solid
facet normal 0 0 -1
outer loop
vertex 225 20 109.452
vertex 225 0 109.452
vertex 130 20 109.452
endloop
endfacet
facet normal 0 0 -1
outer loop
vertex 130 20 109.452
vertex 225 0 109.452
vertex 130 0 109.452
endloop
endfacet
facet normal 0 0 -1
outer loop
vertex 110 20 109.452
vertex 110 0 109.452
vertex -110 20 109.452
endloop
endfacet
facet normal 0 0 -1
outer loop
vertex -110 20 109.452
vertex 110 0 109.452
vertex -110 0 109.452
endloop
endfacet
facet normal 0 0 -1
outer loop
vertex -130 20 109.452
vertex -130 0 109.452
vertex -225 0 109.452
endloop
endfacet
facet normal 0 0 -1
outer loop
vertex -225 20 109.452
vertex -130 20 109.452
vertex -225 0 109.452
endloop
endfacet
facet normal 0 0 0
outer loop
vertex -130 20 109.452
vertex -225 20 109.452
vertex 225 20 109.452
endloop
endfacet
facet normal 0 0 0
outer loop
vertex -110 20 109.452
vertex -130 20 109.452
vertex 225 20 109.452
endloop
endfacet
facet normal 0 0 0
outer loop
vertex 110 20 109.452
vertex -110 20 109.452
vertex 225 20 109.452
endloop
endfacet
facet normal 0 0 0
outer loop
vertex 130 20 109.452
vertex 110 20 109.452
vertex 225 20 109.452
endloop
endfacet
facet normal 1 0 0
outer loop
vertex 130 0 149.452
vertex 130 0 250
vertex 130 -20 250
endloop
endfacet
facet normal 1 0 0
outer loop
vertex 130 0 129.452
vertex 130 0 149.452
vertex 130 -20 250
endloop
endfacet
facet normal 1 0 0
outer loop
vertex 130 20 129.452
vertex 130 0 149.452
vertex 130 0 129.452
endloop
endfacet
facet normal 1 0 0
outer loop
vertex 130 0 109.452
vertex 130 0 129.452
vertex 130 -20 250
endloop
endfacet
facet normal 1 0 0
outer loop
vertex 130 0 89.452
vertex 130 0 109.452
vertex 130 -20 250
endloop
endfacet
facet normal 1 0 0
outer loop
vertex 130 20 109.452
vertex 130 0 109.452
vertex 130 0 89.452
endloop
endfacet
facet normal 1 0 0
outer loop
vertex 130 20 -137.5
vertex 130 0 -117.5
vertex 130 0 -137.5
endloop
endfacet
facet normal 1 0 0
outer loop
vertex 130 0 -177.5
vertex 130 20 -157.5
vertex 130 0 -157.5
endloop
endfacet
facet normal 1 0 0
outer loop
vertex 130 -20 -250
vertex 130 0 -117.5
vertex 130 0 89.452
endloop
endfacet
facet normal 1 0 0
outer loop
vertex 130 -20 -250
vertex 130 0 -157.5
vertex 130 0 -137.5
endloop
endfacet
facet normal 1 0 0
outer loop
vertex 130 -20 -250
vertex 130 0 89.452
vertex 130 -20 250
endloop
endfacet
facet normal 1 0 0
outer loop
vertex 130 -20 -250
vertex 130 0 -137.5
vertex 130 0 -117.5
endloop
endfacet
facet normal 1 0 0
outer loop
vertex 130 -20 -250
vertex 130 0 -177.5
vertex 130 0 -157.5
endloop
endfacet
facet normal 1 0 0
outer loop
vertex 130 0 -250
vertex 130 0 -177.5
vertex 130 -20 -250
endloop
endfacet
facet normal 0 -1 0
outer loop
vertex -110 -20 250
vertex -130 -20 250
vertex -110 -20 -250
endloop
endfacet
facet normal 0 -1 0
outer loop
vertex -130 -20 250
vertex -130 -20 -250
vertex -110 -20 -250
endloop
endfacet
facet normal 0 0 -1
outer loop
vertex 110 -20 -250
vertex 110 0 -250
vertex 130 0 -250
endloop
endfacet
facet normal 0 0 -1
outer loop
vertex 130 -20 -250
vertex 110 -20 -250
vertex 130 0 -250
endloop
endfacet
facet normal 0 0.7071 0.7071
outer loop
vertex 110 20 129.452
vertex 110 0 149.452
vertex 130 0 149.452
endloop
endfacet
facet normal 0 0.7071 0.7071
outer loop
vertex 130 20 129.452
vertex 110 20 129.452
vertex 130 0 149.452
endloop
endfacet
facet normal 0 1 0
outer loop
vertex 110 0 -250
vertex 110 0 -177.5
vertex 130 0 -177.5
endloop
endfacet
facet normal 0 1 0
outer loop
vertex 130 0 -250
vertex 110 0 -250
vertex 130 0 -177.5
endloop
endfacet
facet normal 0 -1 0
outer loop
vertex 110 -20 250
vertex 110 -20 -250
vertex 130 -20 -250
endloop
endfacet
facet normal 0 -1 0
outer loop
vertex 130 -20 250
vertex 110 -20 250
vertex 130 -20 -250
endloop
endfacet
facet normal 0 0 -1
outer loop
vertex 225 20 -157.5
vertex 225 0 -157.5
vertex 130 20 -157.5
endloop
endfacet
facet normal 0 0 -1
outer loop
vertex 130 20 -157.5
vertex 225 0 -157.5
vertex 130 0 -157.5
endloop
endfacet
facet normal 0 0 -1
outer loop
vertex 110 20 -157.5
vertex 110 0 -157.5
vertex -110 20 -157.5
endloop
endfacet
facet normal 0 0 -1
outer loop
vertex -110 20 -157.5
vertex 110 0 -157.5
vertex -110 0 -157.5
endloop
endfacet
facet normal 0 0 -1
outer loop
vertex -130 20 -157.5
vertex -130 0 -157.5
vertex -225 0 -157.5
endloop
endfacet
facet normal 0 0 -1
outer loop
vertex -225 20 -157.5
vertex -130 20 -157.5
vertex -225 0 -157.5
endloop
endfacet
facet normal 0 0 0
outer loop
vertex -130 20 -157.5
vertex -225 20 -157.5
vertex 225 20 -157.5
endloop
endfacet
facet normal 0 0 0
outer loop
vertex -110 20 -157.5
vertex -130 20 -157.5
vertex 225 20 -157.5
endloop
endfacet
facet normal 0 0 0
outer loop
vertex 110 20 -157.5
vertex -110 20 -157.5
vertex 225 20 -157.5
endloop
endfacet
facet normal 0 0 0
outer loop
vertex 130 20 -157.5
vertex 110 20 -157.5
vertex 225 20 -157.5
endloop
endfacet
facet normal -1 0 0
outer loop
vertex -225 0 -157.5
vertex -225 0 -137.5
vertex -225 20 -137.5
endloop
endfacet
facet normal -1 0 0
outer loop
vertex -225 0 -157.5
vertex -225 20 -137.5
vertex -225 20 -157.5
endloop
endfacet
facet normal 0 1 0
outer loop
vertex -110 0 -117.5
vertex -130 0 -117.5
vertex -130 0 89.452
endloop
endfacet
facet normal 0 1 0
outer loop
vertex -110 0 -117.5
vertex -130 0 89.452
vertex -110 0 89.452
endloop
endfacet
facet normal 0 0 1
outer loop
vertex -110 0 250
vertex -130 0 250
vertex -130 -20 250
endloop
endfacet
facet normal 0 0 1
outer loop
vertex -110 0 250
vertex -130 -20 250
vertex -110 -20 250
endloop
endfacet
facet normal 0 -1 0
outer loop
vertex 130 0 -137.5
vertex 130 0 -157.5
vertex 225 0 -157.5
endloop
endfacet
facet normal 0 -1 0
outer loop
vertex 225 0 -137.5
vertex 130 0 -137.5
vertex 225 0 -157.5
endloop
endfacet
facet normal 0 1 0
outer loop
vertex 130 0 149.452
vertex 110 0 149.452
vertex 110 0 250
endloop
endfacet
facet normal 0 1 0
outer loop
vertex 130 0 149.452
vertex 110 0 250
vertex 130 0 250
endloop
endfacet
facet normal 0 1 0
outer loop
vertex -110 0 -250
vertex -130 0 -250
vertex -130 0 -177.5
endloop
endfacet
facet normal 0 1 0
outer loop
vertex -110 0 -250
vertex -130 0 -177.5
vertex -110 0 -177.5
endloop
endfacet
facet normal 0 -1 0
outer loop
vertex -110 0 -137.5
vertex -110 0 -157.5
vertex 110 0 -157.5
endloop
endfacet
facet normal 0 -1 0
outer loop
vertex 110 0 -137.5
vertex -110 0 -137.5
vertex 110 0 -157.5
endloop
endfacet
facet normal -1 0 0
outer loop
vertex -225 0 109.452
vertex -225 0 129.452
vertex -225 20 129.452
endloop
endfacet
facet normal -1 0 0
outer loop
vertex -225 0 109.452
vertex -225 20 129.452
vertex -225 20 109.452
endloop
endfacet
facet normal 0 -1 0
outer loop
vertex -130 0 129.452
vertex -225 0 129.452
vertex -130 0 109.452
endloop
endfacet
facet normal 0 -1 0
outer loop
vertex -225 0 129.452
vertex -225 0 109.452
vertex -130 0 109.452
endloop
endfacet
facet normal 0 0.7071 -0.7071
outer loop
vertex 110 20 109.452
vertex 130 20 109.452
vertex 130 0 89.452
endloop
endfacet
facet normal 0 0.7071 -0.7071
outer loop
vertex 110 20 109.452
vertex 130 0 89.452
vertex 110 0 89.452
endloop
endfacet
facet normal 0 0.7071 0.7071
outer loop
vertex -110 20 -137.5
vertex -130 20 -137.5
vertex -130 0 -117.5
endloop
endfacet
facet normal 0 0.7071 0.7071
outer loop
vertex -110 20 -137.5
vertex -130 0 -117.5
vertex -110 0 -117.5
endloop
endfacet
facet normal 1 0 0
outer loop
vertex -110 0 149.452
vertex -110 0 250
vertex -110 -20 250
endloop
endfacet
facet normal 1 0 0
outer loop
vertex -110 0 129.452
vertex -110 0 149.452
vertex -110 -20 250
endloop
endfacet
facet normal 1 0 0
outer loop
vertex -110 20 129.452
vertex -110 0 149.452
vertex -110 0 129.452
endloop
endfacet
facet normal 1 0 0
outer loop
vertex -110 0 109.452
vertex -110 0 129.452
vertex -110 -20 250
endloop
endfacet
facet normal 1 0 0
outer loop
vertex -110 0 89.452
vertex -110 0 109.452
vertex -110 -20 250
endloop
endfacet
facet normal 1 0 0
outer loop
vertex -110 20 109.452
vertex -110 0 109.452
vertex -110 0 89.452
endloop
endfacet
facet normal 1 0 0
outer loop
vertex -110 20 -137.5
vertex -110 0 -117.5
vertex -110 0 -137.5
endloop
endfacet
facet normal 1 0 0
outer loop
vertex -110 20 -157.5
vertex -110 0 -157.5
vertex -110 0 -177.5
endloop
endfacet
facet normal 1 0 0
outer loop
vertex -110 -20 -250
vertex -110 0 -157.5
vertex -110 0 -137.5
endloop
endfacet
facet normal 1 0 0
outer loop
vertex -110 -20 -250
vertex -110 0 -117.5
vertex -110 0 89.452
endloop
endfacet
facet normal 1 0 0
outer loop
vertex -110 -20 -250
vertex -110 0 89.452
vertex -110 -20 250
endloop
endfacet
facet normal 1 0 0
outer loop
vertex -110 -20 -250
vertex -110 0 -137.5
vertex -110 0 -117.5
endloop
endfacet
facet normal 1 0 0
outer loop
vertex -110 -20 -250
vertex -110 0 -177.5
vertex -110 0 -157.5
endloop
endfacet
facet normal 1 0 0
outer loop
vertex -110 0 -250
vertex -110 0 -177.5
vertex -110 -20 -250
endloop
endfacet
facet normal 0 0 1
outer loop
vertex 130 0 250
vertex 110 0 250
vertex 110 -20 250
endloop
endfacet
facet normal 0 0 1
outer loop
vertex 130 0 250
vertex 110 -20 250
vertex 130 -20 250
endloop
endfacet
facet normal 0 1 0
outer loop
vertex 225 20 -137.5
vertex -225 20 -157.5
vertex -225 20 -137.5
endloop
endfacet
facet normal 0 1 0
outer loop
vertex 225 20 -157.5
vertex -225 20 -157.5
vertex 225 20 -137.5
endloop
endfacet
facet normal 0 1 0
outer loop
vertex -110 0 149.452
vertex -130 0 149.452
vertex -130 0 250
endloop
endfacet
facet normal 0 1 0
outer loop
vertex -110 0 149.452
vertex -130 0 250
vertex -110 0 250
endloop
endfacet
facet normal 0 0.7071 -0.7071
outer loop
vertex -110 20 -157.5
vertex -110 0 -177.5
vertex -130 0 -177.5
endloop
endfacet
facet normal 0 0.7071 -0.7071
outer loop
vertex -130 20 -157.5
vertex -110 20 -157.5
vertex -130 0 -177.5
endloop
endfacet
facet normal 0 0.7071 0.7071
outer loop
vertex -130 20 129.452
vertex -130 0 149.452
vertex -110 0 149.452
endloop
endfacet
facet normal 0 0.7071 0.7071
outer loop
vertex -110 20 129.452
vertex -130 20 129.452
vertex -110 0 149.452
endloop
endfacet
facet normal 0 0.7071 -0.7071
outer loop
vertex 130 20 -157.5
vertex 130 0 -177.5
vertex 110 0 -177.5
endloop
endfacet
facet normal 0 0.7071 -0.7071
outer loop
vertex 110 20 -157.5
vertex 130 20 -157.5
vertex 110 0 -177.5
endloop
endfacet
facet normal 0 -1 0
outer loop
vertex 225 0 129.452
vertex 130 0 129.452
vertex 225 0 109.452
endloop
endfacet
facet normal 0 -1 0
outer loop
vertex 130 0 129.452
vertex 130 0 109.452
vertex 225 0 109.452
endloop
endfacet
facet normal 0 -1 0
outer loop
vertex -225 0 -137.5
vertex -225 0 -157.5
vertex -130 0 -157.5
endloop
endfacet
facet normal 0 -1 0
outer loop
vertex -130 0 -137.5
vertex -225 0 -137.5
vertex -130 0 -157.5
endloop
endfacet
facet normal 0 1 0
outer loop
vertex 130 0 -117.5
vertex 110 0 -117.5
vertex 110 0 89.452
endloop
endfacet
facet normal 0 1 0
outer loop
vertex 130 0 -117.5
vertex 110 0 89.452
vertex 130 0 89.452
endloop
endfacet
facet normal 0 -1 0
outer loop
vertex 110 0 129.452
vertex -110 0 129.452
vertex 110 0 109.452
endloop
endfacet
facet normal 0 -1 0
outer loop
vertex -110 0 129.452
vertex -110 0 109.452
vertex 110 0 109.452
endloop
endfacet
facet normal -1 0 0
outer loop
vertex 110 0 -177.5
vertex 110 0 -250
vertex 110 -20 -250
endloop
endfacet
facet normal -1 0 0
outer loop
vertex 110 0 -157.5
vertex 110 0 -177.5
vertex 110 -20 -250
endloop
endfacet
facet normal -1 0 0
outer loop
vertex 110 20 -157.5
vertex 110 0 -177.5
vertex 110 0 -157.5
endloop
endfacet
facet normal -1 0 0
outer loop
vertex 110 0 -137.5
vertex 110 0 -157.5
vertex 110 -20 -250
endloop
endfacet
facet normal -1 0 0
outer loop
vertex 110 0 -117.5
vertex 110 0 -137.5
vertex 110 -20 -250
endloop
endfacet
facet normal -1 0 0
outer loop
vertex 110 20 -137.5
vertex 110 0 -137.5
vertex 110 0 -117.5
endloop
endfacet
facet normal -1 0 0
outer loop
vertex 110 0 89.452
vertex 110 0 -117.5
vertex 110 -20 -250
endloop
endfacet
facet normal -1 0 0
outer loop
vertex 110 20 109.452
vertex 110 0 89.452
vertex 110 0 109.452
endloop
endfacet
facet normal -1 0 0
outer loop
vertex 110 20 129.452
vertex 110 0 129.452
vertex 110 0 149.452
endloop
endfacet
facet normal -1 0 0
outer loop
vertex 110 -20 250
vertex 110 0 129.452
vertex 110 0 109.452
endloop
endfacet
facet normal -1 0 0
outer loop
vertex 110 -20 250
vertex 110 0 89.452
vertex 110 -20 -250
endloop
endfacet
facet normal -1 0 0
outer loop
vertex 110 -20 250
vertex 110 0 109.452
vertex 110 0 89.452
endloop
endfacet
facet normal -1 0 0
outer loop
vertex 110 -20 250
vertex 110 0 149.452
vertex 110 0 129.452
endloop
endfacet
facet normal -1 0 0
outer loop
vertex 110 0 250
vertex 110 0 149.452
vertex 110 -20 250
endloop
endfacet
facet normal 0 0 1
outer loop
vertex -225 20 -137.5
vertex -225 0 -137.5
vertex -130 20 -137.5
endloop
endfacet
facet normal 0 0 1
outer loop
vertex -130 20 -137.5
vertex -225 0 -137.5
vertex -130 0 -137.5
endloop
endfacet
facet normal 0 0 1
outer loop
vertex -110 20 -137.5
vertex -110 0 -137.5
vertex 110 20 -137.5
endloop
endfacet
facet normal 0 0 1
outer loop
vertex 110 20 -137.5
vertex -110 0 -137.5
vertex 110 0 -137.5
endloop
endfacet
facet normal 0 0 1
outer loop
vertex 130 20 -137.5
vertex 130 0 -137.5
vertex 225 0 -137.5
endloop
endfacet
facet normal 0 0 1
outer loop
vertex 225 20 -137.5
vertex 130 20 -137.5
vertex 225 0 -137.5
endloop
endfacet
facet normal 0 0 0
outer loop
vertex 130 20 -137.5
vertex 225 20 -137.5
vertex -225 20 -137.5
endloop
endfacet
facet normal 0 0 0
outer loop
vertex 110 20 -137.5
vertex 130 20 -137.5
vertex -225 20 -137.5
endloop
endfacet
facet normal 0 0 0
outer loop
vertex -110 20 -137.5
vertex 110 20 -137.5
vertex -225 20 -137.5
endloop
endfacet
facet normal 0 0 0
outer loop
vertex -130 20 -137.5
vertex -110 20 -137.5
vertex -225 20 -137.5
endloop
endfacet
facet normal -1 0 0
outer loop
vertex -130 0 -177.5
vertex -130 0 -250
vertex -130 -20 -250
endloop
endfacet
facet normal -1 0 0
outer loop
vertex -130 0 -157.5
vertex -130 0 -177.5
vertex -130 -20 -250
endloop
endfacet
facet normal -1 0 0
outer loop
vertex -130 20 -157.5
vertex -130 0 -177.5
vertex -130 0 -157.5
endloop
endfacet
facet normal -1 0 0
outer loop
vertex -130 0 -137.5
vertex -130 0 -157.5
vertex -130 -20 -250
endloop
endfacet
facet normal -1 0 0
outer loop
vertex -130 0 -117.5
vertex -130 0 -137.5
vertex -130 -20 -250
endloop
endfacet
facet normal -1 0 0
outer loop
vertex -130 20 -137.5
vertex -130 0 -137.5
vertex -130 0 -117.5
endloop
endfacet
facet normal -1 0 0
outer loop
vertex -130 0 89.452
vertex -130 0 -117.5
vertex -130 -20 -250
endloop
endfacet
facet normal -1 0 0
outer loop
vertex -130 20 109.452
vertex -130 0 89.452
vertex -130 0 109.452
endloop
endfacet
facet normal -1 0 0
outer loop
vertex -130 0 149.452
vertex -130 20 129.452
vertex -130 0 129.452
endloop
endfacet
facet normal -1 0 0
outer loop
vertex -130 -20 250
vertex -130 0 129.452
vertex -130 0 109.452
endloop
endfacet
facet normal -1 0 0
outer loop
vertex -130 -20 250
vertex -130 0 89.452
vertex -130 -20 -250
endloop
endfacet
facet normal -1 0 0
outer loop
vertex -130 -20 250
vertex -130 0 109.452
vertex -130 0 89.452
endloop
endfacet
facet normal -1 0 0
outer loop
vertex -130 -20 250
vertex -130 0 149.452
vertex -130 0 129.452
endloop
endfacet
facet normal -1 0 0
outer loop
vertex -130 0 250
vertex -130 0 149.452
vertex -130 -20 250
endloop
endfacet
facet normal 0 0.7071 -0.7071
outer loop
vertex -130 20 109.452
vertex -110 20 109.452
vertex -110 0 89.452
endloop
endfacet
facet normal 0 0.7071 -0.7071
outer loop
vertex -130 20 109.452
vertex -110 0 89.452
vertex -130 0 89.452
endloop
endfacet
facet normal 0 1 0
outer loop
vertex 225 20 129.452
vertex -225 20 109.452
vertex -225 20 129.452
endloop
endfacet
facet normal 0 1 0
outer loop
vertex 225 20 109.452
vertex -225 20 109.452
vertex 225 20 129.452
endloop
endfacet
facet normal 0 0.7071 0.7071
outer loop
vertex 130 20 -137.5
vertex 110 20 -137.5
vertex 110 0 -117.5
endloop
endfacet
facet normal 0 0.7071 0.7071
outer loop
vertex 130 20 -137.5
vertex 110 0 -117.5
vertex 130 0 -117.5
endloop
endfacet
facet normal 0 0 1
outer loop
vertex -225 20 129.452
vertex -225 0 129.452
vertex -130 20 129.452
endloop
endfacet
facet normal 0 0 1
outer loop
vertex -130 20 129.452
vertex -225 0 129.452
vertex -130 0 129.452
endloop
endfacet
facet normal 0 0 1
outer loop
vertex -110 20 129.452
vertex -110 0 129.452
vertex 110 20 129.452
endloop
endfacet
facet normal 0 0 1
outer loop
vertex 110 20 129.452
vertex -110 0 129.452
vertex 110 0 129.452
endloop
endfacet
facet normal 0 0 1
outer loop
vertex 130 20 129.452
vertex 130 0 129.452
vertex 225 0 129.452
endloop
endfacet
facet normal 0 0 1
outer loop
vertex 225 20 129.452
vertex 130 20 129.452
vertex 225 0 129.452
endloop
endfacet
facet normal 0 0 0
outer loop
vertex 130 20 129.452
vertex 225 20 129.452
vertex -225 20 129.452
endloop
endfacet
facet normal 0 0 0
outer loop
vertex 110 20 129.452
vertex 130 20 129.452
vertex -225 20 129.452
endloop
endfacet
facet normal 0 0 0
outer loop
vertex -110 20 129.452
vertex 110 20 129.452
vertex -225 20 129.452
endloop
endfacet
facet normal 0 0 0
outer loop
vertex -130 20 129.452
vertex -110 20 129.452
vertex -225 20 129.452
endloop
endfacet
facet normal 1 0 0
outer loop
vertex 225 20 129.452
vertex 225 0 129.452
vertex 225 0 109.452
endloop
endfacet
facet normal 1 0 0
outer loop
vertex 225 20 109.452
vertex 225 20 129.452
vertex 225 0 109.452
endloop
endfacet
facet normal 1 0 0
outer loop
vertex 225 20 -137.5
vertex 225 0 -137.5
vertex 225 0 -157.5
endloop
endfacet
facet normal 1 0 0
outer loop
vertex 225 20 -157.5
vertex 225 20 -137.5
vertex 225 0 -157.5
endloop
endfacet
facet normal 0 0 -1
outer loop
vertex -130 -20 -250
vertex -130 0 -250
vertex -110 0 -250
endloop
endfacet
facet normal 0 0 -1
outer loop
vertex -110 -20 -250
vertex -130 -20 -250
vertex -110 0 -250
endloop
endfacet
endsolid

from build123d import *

# Parameters (mm, degrees)
SKETCH_1_W      = 95
SKETCH_1_H      = 20
SKETCH_1_W_2    = 20
SKETCH_1_W_3    = 220
EXTRUDE_4_DEPTH = 20
SKETCH_1_16_W   = 20
SKETCH_1_16_H   = 92.5
SKETCH_1_16_H_2 = 20
SKETCH_1_16_H_3 = 246.95222931
SKETCH_1_16_H_4 = 120.54777069
EXTRUDE_5_DEPTH = 20
CHAMFER_9_SIZE  = 20
CHAMFER_10_SIZE = 20


with BuildPart() as part:
    # 草图1 → 凸台-拉伸4 (new body)
    with BuildSketch(Plane(origin=(0, 0, 0), x_dir=(1, 0, 0), z_dir=(0, 1, 0))):
        with Locations((-177.5, 147.5)):
            Rectangle(SKETCH_1_W, SKETCH_1_H)
        with Locations((-120, 147.5)):
            Rectangle(SKETCH_1_W_2, SKETCH_1_H)
        with Locations((0, 147.5)):
            Rectangle(SKETCH_1_W_3, SKETCH_1_H)
        with Locations((177.5, 147.5)):
            Rectangle(SKETCH_1_W, SKETCH_1_H)
        with Locations((120, 147.5)):
            Rectangle(SKETCH_1_W_2, SKETCH_1_H)
        with Locations((177.5, -119.45222931)):
            Rectangle(SKETCH_1_W, SKETCH_1_H)
        with Locations((120, -119.45222931)):
            Rectangle(SKETCH_1_W_2, SKETCH_1_H)
        with Locations((0, -119.45222931)):
            Rectangle(SKETCH_1_W_3, SKETCH_1_H)
        with Locations((-120, -119.45222931)):
            Rectangle(SKETCH_1_W_2, SKETCH_1_H)
        with Locations((-177.5, -119.45222931)):
            Rectangle(SKETCH_1_W, SKETCH_1_H)
    extrude(amount=EXTRUDE_4_DEPTH)

    # 草图1<16> → 凸台-拉伸5 (add)
    with BuildSketch(Plane(origin=(0, 0, 0), x_dir=(1, 0, 0), z_dir=(0, 1, 0))):
        with Locations((120, 203.75)):
            Rectangle(SKETCH_1_16_W, SKETCH_1_16_H)
        with Locations((120, 147.5)):
            Rectangle(SKETCH_1_16_W, SKETCH_1_16_H_2)
        with Locations((120, 14.023885345)):
            Rectangle(SKETCH_1_16_W, SKETCH_1_16_H_3)
        with Locations((120, -119.45222931)):
            Rectangle(SKETCH_1_16_W, SKETCH_1_16_H_2)
        with Locations((120, -189.726114655)):
            Rectangle(SKETCH_1_16_W, SKETCH_1_16_H_4)
        with Locations((-120, -189.726114655)):
            Rectangle(SKETCH_1_16_W, SKETCH_1_16_H_4)
        with Locations((-120, -119.45222931)):
            Rectangle(SKETCH_1_16_W, SKETCH_1_16_H_2)
        with Locations((-120, 14.023885345)):
            Rectangle(SKETCH_1_16_W, SKETCH_1_16_H_3)
        with Locations((-120, 147.5)):
            Rectangle(SKETCH_1_16_W, SKETCH_1_16_H_2)
        with Locations((-120, 203.75)):
            Rectangle(SKETCH_1_16_W, SKETCH_1_16_H)
    extrude(amount=-EXTRUDE_5_DEPTH)

    # 倒角9
    chamfer_9_edges = [part.edges().sort_by_distance(p)[0] for p in [
        (120, 0, 129.45222931),
    ]]
    chamfer(chamfer_9_edges, length=CHAMFER_9_SIZE - 0.0001)  # a hair under: the kernel refuses the full size

    # 倒角10
    chamfer_10_edges = [part.edges().sort_by_distance(p)[0] for p in [
        (120, 0, -137.5),
        (120, 0, -157.5),
        (120, 0, 109.45222931),
        (-120, 0, 129.45222931),
        (-120, 0, 109.45222931),
        (-120, 0, -137.5),
        (-120, 0, -157.5),
    ]]
    chamfer(chamfer_10_edges, length=CHAMFER_10_SIZE - 0.0001)  # a hair under: the kernel refuses the full size


solid = part.part
